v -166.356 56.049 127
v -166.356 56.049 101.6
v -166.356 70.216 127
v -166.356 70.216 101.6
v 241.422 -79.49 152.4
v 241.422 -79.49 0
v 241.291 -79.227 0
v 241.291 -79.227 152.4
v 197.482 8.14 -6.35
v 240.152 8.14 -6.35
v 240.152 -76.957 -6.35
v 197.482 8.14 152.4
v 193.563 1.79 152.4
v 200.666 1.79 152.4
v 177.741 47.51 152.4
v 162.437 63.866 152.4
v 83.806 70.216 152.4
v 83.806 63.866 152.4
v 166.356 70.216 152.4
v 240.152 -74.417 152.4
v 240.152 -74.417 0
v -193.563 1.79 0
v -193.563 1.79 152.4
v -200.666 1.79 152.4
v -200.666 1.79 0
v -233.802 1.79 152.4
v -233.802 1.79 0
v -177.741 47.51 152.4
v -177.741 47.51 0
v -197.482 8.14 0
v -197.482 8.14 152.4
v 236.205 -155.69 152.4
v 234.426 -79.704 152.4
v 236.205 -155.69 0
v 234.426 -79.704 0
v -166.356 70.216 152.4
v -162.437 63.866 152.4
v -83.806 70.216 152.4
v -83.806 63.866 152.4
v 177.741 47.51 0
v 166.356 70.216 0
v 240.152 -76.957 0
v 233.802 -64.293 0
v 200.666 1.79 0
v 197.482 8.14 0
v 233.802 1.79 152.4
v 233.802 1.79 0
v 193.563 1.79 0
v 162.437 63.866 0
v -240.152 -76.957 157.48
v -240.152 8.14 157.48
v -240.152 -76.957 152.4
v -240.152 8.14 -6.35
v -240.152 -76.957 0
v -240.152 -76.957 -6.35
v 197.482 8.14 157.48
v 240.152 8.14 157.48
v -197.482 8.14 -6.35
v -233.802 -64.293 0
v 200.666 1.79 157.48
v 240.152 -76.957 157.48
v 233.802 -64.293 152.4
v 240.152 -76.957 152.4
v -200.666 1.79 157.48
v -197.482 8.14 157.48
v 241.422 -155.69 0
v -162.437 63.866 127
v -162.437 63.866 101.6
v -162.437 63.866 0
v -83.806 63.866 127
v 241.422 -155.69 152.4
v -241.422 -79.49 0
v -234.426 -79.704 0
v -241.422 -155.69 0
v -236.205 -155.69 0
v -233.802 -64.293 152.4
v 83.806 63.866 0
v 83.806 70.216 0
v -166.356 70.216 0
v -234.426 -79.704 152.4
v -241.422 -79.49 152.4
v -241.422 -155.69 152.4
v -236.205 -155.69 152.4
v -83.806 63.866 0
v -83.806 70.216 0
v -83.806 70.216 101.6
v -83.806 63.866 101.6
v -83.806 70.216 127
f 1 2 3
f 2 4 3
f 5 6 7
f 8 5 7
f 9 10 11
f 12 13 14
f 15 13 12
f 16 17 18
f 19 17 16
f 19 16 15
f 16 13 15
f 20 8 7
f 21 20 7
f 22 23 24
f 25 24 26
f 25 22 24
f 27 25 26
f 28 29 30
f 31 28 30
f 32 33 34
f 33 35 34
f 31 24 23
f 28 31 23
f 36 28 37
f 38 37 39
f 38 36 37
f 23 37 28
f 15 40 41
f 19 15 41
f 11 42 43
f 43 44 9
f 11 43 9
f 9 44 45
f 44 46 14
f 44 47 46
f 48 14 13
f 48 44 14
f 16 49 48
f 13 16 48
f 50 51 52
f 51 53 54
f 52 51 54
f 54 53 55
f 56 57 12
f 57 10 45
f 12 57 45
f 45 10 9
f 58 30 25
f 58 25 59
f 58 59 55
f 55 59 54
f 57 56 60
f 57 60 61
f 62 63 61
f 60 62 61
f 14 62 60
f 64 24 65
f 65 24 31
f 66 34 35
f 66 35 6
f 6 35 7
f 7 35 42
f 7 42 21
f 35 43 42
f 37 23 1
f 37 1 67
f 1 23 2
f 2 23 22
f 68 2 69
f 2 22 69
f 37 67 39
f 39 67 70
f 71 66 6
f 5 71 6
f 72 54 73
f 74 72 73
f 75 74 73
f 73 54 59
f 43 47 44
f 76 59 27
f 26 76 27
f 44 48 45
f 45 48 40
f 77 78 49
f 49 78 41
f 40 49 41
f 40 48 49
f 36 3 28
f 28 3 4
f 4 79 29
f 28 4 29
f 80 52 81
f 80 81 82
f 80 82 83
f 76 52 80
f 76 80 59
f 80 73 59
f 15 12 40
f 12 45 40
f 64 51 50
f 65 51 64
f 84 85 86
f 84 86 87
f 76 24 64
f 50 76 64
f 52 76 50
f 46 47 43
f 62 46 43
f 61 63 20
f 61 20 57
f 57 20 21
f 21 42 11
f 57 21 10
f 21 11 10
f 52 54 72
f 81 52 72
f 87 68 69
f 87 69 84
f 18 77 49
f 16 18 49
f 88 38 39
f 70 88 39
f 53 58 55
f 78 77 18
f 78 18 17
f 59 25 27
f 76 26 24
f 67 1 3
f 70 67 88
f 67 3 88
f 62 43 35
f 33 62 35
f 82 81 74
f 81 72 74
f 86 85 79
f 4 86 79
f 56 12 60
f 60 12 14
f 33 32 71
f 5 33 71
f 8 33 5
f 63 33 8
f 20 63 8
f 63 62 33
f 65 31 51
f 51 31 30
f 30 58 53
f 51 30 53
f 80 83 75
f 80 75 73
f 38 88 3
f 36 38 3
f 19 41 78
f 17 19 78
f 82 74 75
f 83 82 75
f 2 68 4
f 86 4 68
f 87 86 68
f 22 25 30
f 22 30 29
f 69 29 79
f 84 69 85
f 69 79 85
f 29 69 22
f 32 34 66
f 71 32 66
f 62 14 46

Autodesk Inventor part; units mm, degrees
ref_plane "YZ Plane" through (0, 0, 0) normal (1, 0, 0) x (0, 1, 0)
ref_plane "Work Plane2" through (0, 0, 0) normal (0, 0, 1) x (1, 0, 0)
sketch "Sketch2" plane through (0, 0, 0) normal (0, 0, 1) x (1, 0, 0)
  line L0 (162.4366, 63.866) -> (234.4261, -79.7039) projected
  line L1 (241.4222, -79.4895) -> (177.7412, 47.5105) projected
  line L2 (-228.4778, -3.2895) -> (228.7222, -3.2895) projected
  line L3 (228.7222, -3.2895) -> (228.7222, -54.0895) projected
  line L4 (-228.4778, -3.2895) -> (-228.4778, -54.0895) projected
  line L5 (241.4222, -155.6895) -> (241.4222, -79.4895) projected
  line L6 (241.4222, -79.4895) -> (166.3561, 70.216) projected
  line L7 (166.3561, 70.216) -> (77.4561, 70.216) projected
  line L8 (77.4561, 70.216) -> (77.4561, 47.5105) projected
  line L9 (77.4561, 47.5105) -> (-77.2118, 47.5105) projected
  line L10 (-77.2118, 47.5105) -> (-77.2118, 70.216) projected
  line L11 (-77.2118, 70.216) -> (-166.1118, 70.216) projected
  line L12 (-166.1118, 70.216) -> (-241.1778, -79.4895) projected
  line L13 (-241.1778, -79.4895) -> (-241.1778, -155.6895) projected
  line L14 (-241.1778, -155.6895) -> (-233.8379, -155.6895) projected
  line L15 (-233.8379, -155.6895) -> (-231.9549, -75.263) projected
  line L16 (-231.9549, -75.263) -> (-162.1922, 63.866) projected
  line L17 (-162.1922, 63.866) -> (-83.5618, 63.866) projected
  line L18 (-83.5618, 63.866) -> (-83.5618, 41.1605) projected
  line L19 (-83.5618, 41.1605) -> (83.8061, 41.1605) projected
  line L20 (83.8061, 41.1605) -> (83.8061, 63.866) projected
  line L21 (83.8061, 63.866) -> (162.4366, 63.866) projected
  line L22 (162.4366, 63.866) -> (234.4261, -79.7039) projected
  line L23 (234.4261, -79.7039) -> (236.2052, -155.6895) projected
  line L24 (236.2052, -155.6895) -> (241.4222, -155.6895) projected
  line L25 (233.8022, -54.0895) -> (233.8022, 1.7905)
  line L26 (233.8022, 1.7905) -> (-233.5578, 1.7905)
  line L27 (-233.5578, 1.7905) -> (-233.5578, -54.0895)
  line L28 (240.1522, -54.0895) -> (240.1522, 8.1405)
  line L29 (240.1522, 8.1405) -> (-239.9078, 8.1405)
  line L30 (-239.9078, 8.1405) -> (-239.9078, -54.0895)
  line L31 (233.8022, -54.0895) -> (233.8022, -64.2928)
  line L32 (240.1522, -54.0895) -> (240.1522, -76.9567)
  line L33 (233.8022, -64.2928) -> (234.0782, -64.8433)
  line L34 (240.1522, -76.9567) -> (241.4222, -79.4895)
  line L35 (241.4222, -79.4895) -> (241.4222, -155.6895)
  line L36 (241.4222, -155.6895) -> (236.2052, -155.6895)
  line L37 (236.2052, -155.6895) -> (234.4261, -79.7039)
  line L38 (233.8022, -64.2928) -> (234.4261, -79.7039)
  line L39 (83.8061, 63.866) -> (83.8061, 70.216)
  point P0 (0, 0)
  point P1 (197.4823, 8.1405)
  point P2 (193.5628, 1.7905)
  dimension "d0" = 5.08
  dimension "d1" = 6.35
ref_plane "Work Plane3" through (-241.1778, -155.6895, 152.4) normal (0, 0, -1) x (0, 1, 0)
extrude "Extrusion1" add sketch "Sketch2" along normal up to surface (152.4 mm away) contours L21 L39 L7 L6 L1 L29 L0 | L29 L1 L26 L0 | L29 L28 L32 L1 L31 L25 L26 | L38 L1 L5 L24 L23
sketch "Sketch3" plane through (83.8061, 70.216, 152.4) normal (0, 0, 1) x (1, 0, 0)
  line L0 (156.3461, -62.0755) -> (113.6762, -62.0755) projected
  line L1 (156.3461, -147.1727) -> (156.3461, -62.0755) projected
  line L2 (113.6762, -62.0755) -> (156.3461, -62.0755)
  line L3 (157.6161, -149.7055) -> (156.3461, -147.1727) projected
  line L4 (156.3461, -62.0755) -> (156.3461, -147.1727)
  line L5 (156.3461, -147.1727) -> (116.8602, -68.4255)
  line L6 (109.7567, -68.4255) -> (149.9961, -68.4255) projected
  line L7 (113.6762, -62.0755) -> (116.8602, -68.4255)
  point P0 (-83.8061, -70.216)
extrude "Extrusion2" add sketch "Sketch3" along normal blind 5.08
sketch "Sketch4" plane through (0, 0, 0) normal (0, 0, -1) x (-1, 0, 0)
  line L0 (-240.1522, 8.1405) -> (-197.4823, 8.1405) projected
  line L1 (-240.1522, -76.9567) -> (-240.1522, 8.1405) projected
  line L2 (-233.8022, 1.7905) -> (-233.8022, -64.2928) projected
  line L3 (-241.4222, -79.4895) -> (-177.7412, 47.5105) projected
  line L4 (-193.5628, 1.7905) -> (-233.8022, 1.7905) projected
  line L5 (-241.4222, -79.4895) -> (-177.7412, 47.5105) projected
  line L6 (-240.1522, -76.9567) -> (-197.4823, 8.1405)
  line L7 (-240.1522, 8.1405) -> (-197.4823, 8.1405)
  line L8 (-240.1522, 8.1405) -> (-240.1522, -76.9567)
  point P0 (0, 0)
extrude "Extrusion3" add sketch "Sketch4" along normal blind 6.35
chamfer "Chamfer2" distance 2.54 angle 45 1 edges at (240.1522, -76.9567, 76.2)
mirror "Mirror1" about plane through (0, 0, 0) normal (1, 0, 0) of "Extrusion1", "Extrusion3", "Extrusion2"
sketch "Sketch5" plane through (-166.3561, 70.216, 0) normal (0, 1, 0) x (1, 0, 0)
  line L0 (82.55, 0) -> (82.55, -152.4) projected
  line L1 (82.55, -98.2218) -> (122.6635, -98.2218)
  line L2 (122.6635, -98.2218) -> (122.6635, -130.3782)
  line L3 (122.6635, -130.3782) -> (82.55, -130.3782)
  line L4 (82.55, -130.3782) -> (82.55, -98.2218)
  line L5 (21.7357, -104.5718) -> (47.1357, -104.5718) projected
  line L6 (21.7357, -124.0282) -> (47.1357, -124.0282) projected
  point P0 (166.3561, 0)
  dimension "d14" = 6.35
  dimension "d15" = 6.35
extrude "Extrusion5" cut sketch "Sketch5" against normal blind 50.8
sketch "Sketch6" plane through (-166.3561, 70.216, 0) normal (0, 1, 0) x (1, 0, 0)
  line L0 (-62.1217, -101.6) -> (395.0783, -101.6) projected
  line L1 (90.2783, -124.0282) -> (109.3283, -124.0282) projected
  line L2 (90.2783, -129.1082) -> (90.2783, -124.0282) projected
  line L3 (109.3283, -129.1082) -> (90.2783, -129.1082) projected
  line L4 (109.3283, -124.0282) -> (109.3283, -129.1082) projected
  line L5 (-62.1217, -127) -> (395.0783, -127) projected
  line L6 (0, 0) -> (0, -152.4) projected
  line L7 (82.4528, -101.6) -> (0, -101.6)
  line L8 (0, -101.6) -> (0, -127)
  line L9 (0, -127) -> (82.4528, -127)
  line L10 (82.4528, -127) -> (82.4528, -101.6)
  point P0 (166.3561, 0)
  point P1 (0, -101.6)
extrude "Extrusion6" cut sketch "Sketch6" against normal blind 50.8 contours L0 L10 L5 L6
sketch "Sketch7" plane through (-83.8061, 63.866, 0) normal (1, 0, 0) x (0, 0, -1)
  line L0 (-127, 0) -> (-101.6, 0) projected
  line L1 (-127, 6.35) -> (-127, 0) projected
  line L2 (-101.6, 6.35) -> (-127, 6.35) projected
  line L3 (-101.6, 6.35) -> (-101.6, 0) projected
  line L4 (-127, 6.35) -> (-101.6, 6.35)
  line L5 (-101.6, 6.35) -> (-101.6, 0)
  line L6 (-101.6, 0) -> (-127, 0)
  line L7 (-127, 0) -> (-127, 6.35)
  point P0 (0, -63.866)
extrude "Extrusion7" cut sketch "Sketch7" against normal blind 50.8
properties part number "Middle sector"
